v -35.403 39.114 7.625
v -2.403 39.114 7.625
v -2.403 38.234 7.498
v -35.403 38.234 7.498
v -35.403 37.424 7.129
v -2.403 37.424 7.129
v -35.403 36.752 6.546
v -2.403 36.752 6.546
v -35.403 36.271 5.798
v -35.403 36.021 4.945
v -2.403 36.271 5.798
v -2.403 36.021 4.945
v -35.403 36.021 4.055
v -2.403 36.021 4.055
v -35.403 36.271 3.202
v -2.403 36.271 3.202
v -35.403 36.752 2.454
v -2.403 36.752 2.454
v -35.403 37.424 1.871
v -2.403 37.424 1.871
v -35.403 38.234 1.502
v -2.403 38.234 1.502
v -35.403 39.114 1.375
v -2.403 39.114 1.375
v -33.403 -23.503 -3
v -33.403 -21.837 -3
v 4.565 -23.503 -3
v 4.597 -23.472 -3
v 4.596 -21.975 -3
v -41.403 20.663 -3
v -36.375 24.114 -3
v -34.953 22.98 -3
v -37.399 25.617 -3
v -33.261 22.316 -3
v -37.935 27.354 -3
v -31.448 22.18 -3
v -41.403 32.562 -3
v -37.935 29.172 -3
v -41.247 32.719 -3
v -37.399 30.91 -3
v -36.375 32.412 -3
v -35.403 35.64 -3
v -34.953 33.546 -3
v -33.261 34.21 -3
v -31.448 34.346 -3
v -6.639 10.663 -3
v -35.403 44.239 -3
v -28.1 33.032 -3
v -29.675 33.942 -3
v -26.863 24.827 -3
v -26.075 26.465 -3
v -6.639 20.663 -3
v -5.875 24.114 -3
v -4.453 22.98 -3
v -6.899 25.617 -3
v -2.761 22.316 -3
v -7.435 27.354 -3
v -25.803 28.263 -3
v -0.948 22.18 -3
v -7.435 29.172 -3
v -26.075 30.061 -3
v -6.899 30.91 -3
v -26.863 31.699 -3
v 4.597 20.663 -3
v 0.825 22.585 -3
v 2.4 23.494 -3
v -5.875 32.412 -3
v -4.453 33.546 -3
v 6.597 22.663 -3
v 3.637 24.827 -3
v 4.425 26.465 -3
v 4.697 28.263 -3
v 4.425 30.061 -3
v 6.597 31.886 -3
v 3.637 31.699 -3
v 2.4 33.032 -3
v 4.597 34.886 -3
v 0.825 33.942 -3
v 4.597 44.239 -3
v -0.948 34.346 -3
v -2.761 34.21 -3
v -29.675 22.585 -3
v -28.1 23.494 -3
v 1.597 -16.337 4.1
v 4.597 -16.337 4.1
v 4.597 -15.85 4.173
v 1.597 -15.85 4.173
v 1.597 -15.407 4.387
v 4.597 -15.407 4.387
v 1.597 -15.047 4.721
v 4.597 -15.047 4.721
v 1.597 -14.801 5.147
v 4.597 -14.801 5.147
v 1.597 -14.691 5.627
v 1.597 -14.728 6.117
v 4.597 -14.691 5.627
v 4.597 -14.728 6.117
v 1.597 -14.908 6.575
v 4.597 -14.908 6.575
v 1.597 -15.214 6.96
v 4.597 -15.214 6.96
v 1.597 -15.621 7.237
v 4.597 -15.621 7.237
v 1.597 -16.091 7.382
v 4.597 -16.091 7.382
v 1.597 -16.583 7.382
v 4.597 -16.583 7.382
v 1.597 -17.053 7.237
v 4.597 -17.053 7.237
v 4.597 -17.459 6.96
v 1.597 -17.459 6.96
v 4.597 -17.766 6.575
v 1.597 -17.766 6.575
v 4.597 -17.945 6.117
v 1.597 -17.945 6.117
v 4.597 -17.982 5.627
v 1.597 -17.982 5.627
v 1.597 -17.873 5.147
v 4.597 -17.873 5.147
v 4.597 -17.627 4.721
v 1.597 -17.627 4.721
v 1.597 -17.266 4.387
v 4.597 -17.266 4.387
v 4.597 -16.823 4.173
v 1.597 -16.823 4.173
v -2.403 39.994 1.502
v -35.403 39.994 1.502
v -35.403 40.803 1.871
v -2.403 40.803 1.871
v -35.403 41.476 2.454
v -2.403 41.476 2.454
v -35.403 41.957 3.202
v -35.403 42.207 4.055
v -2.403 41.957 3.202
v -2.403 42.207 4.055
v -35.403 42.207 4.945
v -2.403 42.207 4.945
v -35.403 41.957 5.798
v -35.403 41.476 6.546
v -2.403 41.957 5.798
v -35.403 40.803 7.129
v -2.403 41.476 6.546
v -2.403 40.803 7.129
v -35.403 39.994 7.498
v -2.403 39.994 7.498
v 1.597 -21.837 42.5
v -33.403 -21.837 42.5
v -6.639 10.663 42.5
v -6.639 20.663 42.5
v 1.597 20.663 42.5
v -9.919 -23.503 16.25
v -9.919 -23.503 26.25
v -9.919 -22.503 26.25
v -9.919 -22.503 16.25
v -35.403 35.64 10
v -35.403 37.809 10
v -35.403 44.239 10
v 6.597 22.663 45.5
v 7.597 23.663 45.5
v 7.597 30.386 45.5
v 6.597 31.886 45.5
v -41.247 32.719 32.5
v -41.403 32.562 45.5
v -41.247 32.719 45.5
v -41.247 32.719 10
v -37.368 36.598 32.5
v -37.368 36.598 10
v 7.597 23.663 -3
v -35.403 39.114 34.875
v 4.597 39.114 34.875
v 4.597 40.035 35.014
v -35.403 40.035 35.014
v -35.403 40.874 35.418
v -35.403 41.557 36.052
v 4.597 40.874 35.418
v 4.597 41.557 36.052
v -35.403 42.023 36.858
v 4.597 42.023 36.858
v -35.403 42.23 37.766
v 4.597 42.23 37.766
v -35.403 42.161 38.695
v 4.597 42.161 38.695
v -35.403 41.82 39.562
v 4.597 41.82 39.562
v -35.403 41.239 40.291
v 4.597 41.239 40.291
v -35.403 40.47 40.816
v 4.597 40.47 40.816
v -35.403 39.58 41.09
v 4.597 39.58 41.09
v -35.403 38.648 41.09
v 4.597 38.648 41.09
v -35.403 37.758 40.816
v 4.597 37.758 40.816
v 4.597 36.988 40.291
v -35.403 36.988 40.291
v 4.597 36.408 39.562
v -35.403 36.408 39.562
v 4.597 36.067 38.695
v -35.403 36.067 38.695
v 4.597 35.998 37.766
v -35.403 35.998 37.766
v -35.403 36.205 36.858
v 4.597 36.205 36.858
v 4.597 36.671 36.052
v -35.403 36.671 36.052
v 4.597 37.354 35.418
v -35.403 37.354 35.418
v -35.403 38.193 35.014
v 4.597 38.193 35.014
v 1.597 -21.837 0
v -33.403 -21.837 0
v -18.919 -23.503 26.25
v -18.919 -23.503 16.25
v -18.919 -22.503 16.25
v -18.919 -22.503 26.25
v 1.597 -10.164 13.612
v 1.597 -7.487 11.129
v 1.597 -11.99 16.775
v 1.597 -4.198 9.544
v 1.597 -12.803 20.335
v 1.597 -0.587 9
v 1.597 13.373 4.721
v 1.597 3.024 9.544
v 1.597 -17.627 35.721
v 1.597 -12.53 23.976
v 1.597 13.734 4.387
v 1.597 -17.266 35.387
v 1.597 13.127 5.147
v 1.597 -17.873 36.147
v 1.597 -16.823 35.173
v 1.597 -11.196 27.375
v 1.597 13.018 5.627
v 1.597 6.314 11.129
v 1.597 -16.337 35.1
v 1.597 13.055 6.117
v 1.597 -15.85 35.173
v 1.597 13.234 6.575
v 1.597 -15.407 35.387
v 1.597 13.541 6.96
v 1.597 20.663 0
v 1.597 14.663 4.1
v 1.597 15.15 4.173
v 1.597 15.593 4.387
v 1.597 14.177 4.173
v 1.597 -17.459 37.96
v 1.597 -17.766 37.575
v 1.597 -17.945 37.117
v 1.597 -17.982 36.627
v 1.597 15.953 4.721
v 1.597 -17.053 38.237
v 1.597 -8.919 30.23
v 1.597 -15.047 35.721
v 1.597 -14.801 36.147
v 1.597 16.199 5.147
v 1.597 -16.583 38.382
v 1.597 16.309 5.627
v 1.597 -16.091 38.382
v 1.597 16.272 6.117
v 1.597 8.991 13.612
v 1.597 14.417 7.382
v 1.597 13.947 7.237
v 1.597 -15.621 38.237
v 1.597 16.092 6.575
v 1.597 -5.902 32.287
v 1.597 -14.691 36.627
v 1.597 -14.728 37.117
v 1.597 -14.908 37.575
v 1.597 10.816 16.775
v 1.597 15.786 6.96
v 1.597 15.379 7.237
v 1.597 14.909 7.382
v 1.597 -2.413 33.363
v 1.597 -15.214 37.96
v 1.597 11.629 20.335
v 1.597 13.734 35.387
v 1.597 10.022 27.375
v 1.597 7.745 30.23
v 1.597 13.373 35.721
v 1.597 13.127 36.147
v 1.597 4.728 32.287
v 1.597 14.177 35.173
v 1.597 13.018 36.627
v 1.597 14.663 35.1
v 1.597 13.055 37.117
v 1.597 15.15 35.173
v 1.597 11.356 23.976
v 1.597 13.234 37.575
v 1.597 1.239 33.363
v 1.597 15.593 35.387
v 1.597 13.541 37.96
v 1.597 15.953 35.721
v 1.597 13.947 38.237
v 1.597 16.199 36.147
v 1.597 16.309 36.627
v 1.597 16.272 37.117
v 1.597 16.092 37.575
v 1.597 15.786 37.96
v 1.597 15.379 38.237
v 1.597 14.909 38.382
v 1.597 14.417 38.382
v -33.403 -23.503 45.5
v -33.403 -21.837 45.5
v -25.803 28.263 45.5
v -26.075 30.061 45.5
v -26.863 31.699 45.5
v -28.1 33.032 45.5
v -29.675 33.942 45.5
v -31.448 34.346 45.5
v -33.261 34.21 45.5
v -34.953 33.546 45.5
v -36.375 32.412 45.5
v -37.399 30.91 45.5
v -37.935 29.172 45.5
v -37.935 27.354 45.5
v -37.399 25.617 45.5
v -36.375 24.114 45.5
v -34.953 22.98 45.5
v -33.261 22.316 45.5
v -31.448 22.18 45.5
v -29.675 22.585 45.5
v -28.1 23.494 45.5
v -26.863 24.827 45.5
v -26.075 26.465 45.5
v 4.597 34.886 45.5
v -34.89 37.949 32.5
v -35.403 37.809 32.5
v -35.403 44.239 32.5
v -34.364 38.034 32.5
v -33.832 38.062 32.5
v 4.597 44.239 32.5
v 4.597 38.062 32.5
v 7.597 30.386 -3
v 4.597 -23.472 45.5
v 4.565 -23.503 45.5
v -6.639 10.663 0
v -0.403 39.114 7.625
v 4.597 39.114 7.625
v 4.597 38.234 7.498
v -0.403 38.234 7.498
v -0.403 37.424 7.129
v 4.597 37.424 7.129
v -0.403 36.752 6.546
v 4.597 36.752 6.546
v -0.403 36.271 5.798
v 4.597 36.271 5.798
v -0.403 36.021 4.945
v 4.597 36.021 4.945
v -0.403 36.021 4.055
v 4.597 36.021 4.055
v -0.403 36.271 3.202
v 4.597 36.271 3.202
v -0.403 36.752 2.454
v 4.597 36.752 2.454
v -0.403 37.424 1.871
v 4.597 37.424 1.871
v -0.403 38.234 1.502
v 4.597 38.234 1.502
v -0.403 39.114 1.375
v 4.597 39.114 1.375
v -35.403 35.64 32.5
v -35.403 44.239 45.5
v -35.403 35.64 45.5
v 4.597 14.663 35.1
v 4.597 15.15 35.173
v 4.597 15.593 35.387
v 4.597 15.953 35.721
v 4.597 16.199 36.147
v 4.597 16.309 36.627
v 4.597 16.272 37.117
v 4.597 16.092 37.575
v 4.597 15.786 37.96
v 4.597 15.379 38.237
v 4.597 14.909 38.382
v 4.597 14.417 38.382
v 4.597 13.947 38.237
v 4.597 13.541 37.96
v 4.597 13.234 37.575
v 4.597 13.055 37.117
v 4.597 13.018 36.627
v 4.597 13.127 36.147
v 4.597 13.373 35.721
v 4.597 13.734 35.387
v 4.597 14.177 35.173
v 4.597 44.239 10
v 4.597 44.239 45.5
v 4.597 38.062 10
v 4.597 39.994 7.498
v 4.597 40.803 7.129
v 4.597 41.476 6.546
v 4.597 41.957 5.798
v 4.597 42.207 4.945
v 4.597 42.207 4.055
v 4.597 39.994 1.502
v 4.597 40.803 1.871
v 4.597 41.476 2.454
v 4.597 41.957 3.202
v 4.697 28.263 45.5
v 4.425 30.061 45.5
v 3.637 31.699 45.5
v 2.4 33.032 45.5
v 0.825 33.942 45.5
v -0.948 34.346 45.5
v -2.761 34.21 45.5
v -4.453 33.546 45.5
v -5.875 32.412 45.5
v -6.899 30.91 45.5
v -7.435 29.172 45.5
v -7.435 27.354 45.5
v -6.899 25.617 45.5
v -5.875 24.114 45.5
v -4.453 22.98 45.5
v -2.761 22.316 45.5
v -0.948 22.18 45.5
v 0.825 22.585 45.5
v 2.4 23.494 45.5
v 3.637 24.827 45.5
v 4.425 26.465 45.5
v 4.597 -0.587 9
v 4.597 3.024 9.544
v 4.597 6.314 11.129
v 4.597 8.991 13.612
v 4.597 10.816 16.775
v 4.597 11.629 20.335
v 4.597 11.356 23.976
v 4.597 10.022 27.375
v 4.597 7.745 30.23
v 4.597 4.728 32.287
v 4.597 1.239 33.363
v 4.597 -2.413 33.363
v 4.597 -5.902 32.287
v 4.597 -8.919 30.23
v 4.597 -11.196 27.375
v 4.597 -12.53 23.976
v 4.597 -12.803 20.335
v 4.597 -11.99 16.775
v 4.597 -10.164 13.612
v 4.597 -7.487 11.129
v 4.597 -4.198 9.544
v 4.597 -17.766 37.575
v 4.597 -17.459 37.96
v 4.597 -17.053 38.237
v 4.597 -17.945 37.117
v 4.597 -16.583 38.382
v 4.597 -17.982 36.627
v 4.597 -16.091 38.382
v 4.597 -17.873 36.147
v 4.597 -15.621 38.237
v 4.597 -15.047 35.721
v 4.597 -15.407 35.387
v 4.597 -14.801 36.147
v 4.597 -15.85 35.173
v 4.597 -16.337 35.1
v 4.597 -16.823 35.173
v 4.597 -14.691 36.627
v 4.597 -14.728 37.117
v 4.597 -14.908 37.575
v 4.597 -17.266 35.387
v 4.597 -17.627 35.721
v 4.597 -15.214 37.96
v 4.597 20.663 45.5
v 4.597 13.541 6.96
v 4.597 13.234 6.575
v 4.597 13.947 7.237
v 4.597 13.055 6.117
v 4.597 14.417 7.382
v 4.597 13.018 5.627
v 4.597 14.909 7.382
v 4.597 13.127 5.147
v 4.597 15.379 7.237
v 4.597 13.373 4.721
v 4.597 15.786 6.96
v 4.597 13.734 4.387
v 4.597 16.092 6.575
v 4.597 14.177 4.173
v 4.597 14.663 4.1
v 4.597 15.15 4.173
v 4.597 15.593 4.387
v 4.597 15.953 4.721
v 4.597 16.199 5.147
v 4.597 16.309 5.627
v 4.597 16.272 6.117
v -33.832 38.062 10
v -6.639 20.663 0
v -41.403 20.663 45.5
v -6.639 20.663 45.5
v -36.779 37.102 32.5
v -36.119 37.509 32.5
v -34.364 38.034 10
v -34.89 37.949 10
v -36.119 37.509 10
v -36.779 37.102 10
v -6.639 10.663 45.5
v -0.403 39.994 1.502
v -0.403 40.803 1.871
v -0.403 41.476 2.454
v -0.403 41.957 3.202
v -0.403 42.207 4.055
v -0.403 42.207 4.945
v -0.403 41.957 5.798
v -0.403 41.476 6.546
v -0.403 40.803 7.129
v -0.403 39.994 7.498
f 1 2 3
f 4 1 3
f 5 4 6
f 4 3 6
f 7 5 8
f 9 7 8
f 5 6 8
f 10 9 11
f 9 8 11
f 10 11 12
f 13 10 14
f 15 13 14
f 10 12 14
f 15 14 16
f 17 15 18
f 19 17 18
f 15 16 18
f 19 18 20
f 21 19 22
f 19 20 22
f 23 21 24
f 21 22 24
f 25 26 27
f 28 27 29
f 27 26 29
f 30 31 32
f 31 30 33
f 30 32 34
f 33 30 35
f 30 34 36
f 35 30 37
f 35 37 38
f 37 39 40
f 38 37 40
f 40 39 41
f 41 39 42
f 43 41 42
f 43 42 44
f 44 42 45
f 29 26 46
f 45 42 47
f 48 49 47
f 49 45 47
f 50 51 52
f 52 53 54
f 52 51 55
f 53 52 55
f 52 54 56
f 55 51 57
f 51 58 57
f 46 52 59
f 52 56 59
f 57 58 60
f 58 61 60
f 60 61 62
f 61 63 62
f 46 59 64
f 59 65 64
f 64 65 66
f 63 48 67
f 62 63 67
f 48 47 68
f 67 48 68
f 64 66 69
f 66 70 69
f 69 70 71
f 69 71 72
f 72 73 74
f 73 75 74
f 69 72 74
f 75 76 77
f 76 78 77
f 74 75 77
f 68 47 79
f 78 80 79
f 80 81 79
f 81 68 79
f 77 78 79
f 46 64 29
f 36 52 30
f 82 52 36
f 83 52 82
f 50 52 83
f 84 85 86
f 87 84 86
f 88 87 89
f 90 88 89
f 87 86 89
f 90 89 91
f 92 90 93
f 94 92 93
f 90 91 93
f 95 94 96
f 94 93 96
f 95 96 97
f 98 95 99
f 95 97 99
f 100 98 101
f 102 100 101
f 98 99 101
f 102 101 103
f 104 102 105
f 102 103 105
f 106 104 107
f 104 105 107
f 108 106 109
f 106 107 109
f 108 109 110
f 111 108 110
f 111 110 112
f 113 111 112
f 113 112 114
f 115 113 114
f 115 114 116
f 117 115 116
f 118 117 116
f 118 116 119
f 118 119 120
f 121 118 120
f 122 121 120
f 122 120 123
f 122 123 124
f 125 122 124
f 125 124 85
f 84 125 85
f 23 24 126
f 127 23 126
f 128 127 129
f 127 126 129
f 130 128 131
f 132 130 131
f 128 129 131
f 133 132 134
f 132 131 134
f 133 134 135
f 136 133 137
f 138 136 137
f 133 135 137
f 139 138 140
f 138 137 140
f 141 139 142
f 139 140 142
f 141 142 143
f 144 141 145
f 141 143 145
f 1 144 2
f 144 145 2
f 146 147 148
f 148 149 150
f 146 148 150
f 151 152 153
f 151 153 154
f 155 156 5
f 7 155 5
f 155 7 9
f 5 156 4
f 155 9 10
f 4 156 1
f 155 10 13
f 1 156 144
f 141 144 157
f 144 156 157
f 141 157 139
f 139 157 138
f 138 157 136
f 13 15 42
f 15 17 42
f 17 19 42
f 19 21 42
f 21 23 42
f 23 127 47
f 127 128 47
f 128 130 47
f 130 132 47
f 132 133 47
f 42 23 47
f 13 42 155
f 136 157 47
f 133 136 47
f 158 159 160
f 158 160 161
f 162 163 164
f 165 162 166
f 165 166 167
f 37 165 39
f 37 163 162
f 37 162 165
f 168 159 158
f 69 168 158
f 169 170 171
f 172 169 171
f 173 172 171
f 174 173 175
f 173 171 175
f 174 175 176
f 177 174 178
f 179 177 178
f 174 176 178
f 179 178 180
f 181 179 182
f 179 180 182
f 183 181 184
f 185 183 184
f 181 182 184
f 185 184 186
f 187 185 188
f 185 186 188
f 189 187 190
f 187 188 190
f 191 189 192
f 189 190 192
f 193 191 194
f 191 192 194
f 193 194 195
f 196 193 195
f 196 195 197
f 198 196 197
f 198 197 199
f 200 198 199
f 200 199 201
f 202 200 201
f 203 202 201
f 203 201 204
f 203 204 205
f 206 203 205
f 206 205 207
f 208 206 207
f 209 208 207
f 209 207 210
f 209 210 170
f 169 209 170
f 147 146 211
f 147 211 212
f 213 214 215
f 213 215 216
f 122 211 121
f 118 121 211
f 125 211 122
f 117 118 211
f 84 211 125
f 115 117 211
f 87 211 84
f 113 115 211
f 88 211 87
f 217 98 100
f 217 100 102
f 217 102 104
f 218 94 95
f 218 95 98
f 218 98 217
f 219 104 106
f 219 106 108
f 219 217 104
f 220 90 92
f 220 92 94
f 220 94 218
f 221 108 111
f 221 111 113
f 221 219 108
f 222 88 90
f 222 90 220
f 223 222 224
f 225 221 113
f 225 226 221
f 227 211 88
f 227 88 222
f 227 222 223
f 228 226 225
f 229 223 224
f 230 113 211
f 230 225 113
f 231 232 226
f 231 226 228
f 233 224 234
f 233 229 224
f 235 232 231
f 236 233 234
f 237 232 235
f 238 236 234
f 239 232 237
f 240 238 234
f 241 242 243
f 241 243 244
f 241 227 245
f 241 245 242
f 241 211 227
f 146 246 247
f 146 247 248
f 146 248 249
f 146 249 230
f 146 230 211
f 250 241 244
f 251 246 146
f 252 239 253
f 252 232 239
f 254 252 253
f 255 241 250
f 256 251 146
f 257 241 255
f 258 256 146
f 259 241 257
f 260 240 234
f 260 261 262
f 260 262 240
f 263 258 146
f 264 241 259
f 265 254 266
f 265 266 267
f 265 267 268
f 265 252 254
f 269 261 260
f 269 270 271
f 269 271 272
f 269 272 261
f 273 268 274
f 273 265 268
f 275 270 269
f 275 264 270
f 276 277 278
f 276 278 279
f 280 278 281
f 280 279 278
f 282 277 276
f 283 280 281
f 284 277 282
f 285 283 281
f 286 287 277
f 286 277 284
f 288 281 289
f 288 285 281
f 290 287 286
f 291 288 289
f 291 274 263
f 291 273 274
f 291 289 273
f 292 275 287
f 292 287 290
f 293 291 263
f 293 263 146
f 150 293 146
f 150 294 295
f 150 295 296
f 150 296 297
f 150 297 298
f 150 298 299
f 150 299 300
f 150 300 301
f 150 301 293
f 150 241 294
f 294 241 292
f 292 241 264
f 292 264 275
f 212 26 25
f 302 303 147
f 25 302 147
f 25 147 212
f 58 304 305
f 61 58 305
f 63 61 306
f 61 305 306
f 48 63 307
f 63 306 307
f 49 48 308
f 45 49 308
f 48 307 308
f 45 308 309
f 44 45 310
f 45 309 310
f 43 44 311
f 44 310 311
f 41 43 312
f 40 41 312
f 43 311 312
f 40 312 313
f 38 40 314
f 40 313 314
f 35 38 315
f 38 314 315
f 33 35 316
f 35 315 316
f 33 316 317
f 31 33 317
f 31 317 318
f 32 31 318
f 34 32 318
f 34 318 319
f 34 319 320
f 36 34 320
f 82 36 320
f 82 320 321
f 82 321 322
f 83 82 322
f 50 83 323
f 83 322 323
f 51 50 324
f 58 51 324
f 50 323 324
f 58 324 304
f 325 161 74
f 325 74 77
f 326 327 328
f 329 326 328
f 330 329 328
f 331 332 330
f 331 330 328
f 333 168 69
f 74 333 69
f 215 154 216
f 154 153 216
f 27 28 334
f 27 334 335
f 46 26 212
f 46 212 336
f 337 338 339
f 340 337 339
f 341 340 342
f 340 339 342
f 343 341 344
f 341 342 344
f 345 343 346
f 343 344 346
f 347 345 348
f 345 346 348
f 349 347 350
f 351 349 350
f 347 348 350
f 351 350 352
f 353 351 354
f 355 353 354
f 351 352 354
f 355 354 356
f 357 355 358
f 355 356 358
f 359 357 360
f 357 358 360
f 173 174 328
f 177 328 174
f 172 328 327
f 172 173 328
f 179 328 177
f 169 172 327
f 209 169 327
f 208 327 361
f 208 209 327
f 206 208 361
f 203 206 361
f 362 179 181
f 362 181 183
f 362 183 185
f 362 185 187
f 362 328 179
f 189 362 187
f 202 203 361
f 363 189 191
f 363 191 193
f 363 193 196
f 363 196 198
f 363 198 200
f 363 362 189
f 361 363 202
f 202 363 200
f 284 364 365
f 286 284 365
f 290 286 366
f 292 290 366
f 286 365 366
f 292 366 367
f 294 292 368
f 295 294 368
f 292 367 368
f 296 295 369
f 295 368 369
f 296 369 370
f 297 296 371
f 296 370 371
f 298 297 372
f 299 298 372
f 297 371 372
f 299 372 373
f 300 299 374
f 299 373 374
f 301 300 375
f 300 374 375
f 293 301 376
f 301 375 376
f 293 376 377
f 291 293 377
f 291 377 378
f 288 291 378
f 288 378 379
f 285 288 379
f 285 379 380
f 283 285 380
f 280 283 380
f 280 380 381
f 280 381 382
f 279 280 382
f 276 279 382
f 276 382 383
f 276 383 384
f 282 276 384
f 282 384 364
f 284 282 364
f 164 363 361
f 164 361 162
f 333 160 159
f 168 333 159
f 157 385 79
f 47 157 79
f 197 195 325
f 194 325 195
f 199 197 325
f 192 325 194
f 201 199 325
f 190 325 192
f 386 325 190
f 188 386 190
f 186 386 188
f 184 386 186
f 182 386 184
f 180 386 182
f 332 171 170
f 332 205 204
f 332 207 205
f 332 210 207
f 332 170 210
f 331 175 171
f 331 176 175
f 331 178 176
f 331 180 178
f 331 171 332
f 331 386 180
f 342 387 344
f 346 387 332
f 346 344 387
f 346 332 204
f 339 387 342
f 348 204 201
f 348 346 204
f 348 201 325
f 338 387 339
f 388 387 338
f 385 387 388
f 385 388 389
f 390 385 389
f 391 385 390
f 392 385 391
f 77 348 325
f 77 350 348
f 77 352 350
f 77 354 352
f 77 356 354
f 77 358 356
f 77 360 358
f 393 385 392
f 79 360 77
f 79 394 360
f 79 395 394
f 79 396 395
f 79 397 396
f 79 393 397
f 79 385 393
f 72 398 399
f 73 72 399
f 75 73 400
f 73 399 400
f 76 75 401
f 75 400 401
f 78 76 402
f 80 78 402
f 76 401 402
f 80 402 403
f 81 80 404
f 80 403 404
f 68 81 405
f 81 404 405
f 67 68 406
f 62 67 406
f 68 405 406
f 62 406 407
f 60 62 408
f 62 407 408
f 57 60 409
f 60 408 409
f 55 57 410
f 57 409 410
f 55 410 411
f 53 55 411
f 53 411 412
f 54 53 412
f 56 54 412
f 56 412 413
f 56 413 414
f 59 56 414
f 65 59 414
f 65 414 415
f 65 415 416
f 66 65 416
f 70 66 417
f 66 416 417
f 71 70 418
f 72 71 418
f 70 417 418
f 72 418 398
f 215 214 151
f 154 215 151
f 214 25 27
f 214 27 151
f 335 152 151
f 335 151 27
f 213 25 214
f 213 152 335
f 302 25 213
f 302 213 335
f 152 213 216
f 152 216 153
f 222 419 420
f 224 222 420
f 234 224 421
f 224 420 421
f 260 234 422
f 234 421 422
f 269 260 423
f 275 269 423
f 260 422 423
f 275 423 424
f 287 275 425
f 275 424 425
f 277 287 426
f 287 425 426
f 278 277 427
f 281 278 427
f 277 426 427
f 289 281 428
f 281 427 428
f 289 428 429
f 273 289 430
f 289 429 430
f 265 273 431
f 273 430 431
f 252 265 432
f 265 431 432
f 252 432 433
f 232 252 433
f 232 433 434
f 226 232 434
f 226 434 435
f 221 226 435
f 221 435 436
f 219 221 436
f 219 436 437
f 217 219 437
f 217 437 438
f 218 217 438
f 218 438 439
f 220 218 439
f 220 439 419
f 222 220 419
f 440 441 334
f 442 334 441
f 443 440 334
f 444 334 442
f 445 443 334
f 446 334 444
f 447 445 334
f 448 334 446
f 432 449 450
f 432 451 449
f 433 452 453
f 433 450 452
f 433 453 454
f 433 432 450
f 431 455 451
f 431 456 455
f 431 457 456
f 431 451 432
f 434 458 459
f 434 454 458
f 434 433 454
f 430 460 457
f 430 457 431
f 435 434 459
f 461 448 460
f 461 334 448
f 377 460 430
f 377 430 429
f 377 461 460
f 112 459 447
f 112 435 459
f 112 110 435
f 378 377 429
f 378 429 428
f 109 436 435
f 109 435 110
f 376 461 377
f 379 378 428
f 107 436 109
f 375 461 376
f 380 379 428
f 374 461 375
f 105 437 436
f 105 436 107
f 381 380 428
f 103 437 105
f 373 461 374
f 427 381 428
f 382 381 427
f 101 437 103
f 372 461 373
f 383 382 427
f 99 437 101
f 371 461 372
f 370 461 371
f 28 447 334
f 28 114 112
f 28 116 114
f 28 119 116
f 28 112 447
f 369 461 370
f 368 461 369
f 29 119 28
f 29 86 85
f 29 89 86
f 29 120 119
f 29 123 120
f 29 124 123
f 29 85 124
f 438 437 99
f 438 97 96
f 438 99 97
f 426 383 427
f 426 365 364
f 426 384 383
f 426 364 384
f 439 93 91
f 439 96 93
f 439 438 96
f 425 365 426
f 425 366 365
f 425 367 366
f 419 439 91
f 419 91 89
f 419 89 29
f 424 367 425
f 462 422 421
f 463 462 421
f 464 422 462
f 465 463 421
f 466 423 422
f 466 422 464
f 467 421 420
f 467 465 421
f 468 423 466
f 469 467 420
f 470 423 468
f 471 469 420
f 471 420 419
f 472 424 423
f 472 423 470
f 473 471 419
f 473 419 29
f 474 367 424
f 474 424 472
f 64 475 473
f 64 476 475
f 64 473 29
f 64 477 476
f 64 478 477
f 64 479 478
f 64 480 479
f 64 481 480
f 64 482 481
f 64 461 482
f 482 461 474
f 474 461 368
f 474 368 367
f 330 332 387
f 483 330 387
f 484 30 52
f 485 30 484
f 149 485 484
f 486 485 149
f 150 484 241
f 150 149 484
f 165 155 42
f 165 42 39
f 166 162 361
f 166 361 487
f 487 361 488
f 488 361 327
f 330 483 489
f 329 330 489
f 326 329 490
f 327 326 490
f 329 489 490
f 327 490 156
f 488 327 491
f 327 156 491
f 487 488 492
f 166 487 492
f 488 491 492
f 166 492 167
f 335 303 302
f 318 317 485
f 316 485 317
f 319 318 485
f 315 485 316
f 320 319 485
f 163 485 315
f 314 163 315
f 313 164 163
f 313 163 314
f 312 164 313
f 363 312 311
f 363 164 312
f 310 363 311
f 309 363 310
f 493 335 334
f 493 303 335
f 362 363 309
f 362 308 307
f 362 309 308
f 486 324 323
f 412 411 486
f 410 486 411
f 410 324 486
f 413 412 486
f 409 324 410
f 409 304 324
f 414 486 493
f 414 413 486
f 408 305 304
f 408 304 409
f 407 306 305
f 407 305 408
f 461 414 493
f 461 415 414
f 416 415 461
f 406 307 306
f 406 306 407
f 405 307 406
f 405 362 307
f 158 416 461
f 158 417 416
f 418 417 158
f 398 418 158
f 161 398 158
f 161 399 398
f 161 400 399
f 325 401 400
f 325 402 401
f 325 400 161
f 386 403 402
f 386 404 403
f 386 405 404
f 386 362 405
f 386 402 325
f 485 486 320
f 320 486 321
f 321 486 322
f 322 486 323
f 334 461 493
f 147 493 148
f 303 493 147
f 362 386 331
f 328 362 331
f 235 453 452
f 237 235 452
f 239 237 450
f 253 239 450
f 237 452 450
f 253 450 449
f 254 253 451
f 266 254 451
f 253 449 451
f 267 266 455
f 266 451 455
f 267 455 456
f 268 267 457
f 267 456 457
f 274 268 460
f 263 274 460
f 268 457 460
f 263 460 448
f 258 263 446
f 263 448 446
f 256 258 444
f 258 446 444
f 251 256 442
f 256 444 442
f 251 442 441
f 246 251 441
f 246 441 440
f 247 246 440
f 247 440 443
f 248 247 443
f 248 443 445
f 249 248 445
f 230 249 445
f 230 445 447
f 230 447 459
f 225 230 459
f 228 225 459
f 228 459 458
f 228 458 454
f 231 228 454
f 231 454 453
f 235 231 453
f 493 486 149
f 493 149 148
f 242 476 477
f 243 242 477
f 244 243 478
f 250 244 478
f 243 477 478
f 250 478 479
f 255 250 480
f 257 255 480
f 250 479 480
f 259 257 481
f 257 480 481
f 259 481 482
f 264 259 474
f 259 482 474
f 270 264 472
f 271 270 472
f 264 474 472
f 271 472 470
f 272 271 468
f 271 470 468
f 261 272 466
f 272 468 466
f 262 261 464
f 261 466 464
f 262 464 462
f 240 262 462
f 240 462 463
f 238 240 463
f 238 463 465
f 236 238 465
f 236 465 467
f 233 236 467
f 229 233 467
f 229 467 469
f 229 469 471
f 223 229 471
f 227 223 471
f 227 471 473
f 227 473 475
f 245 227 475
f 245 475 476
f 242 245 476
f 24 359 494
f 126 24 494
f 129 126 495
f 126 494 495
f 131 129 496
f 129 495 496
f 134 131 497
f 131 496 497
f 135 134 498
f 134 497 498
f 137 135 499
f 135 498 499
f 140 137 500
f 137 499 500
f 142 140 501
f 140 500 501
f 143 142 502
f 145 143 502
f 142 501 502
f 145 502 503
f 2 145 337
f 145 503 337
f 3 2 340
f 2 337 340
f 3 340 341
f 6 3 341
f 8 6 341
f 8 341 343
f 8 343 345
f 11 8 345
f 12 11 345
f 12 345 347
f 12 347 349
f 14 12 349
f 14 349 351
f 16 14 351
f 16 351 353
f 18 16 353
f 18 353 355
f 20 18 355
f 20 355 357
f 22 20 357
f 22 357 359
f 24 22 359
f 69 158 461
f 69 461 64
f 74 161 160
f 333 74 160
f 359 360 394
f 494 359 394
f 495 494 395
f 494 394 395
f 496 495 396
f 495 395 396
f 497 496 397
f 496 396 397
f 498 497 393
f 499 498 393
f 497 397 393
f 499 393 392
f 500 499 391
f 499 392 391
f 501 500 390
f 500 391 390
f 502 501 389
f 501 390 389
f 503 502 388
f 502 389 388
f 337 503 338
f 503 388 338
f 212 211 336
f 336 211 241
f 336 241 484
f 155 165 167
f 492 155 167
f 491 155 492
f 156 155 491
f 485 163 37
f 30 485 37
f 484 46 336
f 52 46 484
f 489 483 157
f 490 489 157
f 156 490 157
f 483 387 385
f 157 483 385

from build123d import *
from build123d.topology import SkipClean

# Parameters (mm, degrees)
SKETCH1_W            = 42.5
SKETCH1_H            = 55.85
BOSS_EXTRUDE2_DEPTH  = 42.5
SKETCH5_R            = 3.175
CUT_EXTRUDE2_DEPTH   = 42.5
SKETCH6_W            = 42.5
SKETCH6_H            = 42.5
CUT_EXTRUDE3_DEPTH   = 39.5
SKETCH7_R            = 12.25
SKETCH7_R_2          = 1.65
CUT_EXTRUDE4_DEPTH   = 39.5
SKETCH9_W            = 10
SKETCH9_H            = 42.5
CUT_EXTRUDE5_DEPTH   = 39.5
CHAMFER1_SIZE        = 3
CHAMFER2_SIZE        = 2
SKETCH10_W           = 3
SKETCH10_H           = 2.12759362
BOSS_EXTRUDE3_DEPTH  = 3
SKETCH12_W           = 3
SKETCH12_H           = 3
BOSS_EXTRUDE4_DEPTH  = 3
BOSS_EXTRUDE5_DEPTH  = 2
BOSS_EXTRUDE6_DEPTH  = 2
SKETCH16_W           = 9
SKETCH16_H           = 14.17
SKETCH16_R           = 3.125
BOSS_EXTRUDE8_DEPTH  = 5
SKETCH18_W           = 9
SKETCH18_H           = 12.353282928
BOSS_EXTRUDE9_DEPTH  = 2
SKETCH20_W           = 0.494527866
SKETCH20_H           = 3.5
BOSS_EXTRUDE10_DEPTH = 0.2
BOSS_EXTRUDE11_DEPTH = 42.5
BOSS_EXTRUDE12_DEPTH = 48.5
CUT_EXTRUDE8_DEPTH   = 54.5
BOSS_EXTRUDE15_DEPTH = 3
BOSS_EXTRUDE16_DEPTH = 3
BOSS_EXTRUDE17_DEPTH = 1
BOSS_EXTRUDE19_DEPTH = 3
BOSS_EXTRUDE20_DEPTH = 1
BOSS_EXTRUDE21_START = -3
SKETCH34_R           = 3.175
BOSS_EXTRUDE21_DEPTH = 3
SKETCH35_R           = 3.175
BOSS_EXTRUDE22_DEPTH = 3
BOSS_EXTRUDE23_DEPTH = 3
BOSS_EXTRUDE24_DEPTH = 3
CUT_EXTRUDE10_DEPTH  = 1
SKETCH41_W           = 48.5
SKETCH41_H           = 4.770205393
BOSS_EXTRUDE25_DEPTH = 1.3
CHAMFER3_SIZE        = 1.5
SKETCH44_W           = 1
SKETCH44_H           = 12.353282928
BOSS_EXTRUDE26_DEPTH = 7
SKETCH45_W           = 13
SKETCH45_H           = 8.5
SKETCH45_R           = 3.125
SKETCH45_H_2         = 13.67
BOSS_EXTRUDE27_DEPTH = 40
SKETCH46_R           = 3.125
CUT_EXTRUDE11_DEPTH  = 49
CUT_EXTRUDE12_DEPTH  = 68
CUT_EXTRUDE13_DEPTH  = 68
SKETCH49_W           = 2.643980288
SKETCH49_H           = 1.166461892
CUT_EXTRUDE14_DEPTH  = 68
BOSS_EXTRUDE28_DEPTH = 13
BOSS_EXTRUDE29_DEPTH = 48.5
SKETCH53_W           = 2
SKETCH53_H           = 11.22240638
BOSS_EXTRUDE30_DEPTH = 48.5
CHAMFER4_SIZE        = 2
SKETCH57_W           = 22.5
SKETCH57_H           = 6.176641464
BOSS_EXTRUDE32_DEPTH = 46
BOSS_EXTRUDE33_DEPTH = 48.5
BOSS_EXTRUDE35_DEPTH = 48.5
SKETCH55_R           = 6.1
CUT_EXTRUDE15_DEPTH  = 48.5
BOSS_EXTRUDE36_DEPTH = 48.5
SKETCH62_W           = 48.5
SKETCH62_H           = 0.4
CUT_EXTRUDE16_DEPTH  = 48.5
CHAMFER5_SIZE        = 5.5
FILLET1_R            = 5
CUT_EXTRUDE17_DEPTH  = 1
BOSS_EXTRUDE37_DEPTH = 48.5


# Some blends are built 0.0001 mm under size
with BuildPart() as part:
    # Sketch1 → Boss-Extrude2 (new body)
    with BuildSketch(Plane.XY):
        with Locations((-16.653499003, 3.960644895)):
            Rectangle(SKETCH1_W, SKETCH1_H)
    extrude(amount=BOSS_EXTRUDE2_DEPTH)

    # Sketch5 → Cut-Extrude2 (cut)
    with BuildSketch(Plane.XY.offset(42.5)):
        with Locations((-31.903499003, 25.965832134)):
            Circle(SKETCH5_R)
        with Locations(Location((-1.403499003, 25.965832134, 0), (0, 0, 180))):
            Circle(SKETCH5_R)
    extrude(amount=-CUT_EXTRUDE2_DEPTH, mode=Mode.SUBTRACT)

    # Sketch6 → Cut-Extrude3 (cut)
    with BuildSketch(Plane.ZY.offset(37.903499003)):
        with Locations((21.25, -0.586761485)):
            Rectangle(SKETCH6_W, SKETCH6_H)
    extrude(amount=-CUT_EXTRUDE3_DEPTH, mode=Mode.SUBTRACT)

    # Sketch7 → Cut-Extrude4 (cut)
    with BuildSketch(Plane(origin=(4.596500997, 0, 0), x_dir=(0, 0, -1), z_dir=(1, 0, 0))):
        with Locations((-21.25, -0.586761485)):
            Circle(SKETCH7_R)
        with Locations((-36.75, -16.336761485)):
            Circle(SKETCH7_R_2)
        with Locations((-5.75, -16.336761485)):
            Circle(SKETCH7_R_2)
        with Locations((-36.75, 14.663238515)):
            Circle(SKETCH7_R_2)
        with Locations((-5.75, 14.663238515)):
            Circle(SKETCH7_R_2)
    extrude(amount=-CUT_EXTRUDE4_DEPTH, mode=Mode.SUBTRACT)

    # Sketch9 → Cut-Extrude5 (cut)
    with BuildSketch(Plane.XZ.offset(23.964355105)):
        with Locations((-32.903499003, 21.25)):
            Rectangle(SKETCH9_W, SKETCH9_H)
    extrude(amount=-CUT_EXTRUDE5_DEPTH, mode=Mode.SUBTRACT)

    # Chamfer1
    chamfer1_edges = [part.edges().sort_by_distance(p)[0] for p in [
        (-37.903499003, 20.663238515, 21.25),
        (-37.903499003, 31.885644895, 21.25),
    ]]
    chamfer(chamfer1_edges, length=CHAMFER1_SIZE)

    # Chamfer2
    chamfer2_edges = [part.edges().sort_by_distance(p)[0] for p in [
        (4.596500997, -23.964355105, 21.25),
    ]]
    chamfer(chamfer2_edges, length=CHAMFER2_SIZE)

    # Sketch10 → Boss-Extrude3 (add)
    with BuildSketch(Plane.ZY.offset(27.903499003)):
        with Locations((44, -22.900558295)):
            Rectangle(SKETCH10_W, SKETCH10_H)
        with Locations((-1.5, -22.900558295)):
            Rectangle(SKETCH10_W, SKETCH10_H)
    extrude(amount=-BOSS_EXTRUDE3_DEPTH)

    # Sketch12 → Boss-Extrude4 (add)
    with BuildSketch(Plane.ZY.offset(-1.596500997)):
        with Locations((44, 19.163238515)):
            Rectangle(SKETCH12_W, SKETCH12_H)
        with Locations((-1.5, 19.163238515)):
            Rectangle(SKETCH12_W, SKETCH12_H)
    extrude(amount=-BOSS_EXTRUDE4_DEPTH)

    # Sketch13 → Boss-Extrude5 (add)
    with BuildSketch(Plane(origin=(0, 0, -3), x_dir=(-1, 0, 0), z_dir=(0, 0, -1))):
        Polygon((-1.596500997, 17.663238515), (24.903499003, -21.836761485), (27.903499003, -21.836761485), (-1.596500997, 20.663238515), align=None)
    extrude(amount=-BOSS_EXTRUDE5_DEPTH)

    # Sketch14 → Boss-Extrude6 (add)
    with BuildSketch(Plane.XY.offset(45.5)):
        Polygon((1.596500997, 17.663238515), (-24.903499003, -21.836761485), (-27.903499003, -21.836761485), (1.596500997, 20.663238515), align=None)
    extrude(amount=-BOSS_EXTRUDE6_DEPTH)

    # Sketch16 → Boss-Extrude8 (add)
    # profile 1 of 2: a face of its own
    with BuildSketch(Plane(origin=(4.596500997, 0, 0), x_dir=(0, 0, -1), z_dir=(1, 0, 0))):
        with Locations((-38, 37.153927823)):
            Rectangle(SKETCH16_W, SKETCH16_H)
        with Locations((-38, 39.113927823)):
            Circle(SKETCH16_R, mode=Mode.SUBTRACT)
    # profile 2 of 2: a face of its own
    with BuildSketch(Plane(origin=(4.596500997, 0, 0), x_dir=(0, 0, -1), z_dir=(1, 0, 0))):
        with Locations((-4.5, 37.153927823)):
            Rectangle(SKETCH16_W, SKETCH16_H)
        with Locations(Location((-4.5, 39.113927823, 0), (0, 0, 180))):
            Circle(SKETCH16_R, mode=Mode.SUBTRACT)
    extrude(amount=-BOSS_EXTRUDE8_DEPTH)

    # Sketch18 → Boss-Extrude9 (add)
    with BuildSketch(Plane.ZY.offset(0.403499003)):
        with Locations((4.5, 38.062286359)):
            Rectangle(SKETCH18_W, SKETCH18_H)
        with Locations((38, 38.062286359)):
            Rectangle(SKETCH18_W, SKETCH18_H)
    extrude(amount=BOSS_EXTRUDE9_DEPTH)

    # Sketch20 → Boss-Extrude10 (add)
    with BuildSketch(Plane.XZ.offset(23.964355105)):
        with Locations((-12.40623507, 23)):
            Rectangle(SKETCH20_W, SKETCH20_H)
    extrude(amount=BOSS_EXTRUDE10_DEPTH)

    # Sketch22 → Boss-Extrude11 (add)
    with BuildSketch(Plane.XY.offset(42.5)):
        Polygon((-27.903499003, -23.964355105), (-27.903499003, -24.964355105), (4.596500997, -24.964355105), (4.596500997, -21.964355105), (2.596500997, -23.964355105), align=None)
    extrude(amount=-BOSS_EXTRUDE11_DEPTH)

    # Sketch23 → Boss-Extrude12 (add)
    with BuildSketch(Plane.XY.offset(45.5)):
        Polygon((1.596500997, -21.836761485), (-33.403499003, -21.836761485), (-33.403499003, -24.836761485), (1.596500997, -24.964355105), align=None)
    extrude(amount=-BOSS_EXTRUDE12_DEPTH)

    # Sketch24 → Cut-Extrude8 (cut)
    with BuildSketch(Plane.XY.offset(45.5)):
        Polygon((-27.903499003, -24.856811911), (-27.903499003, -24.964355105), (1.596500997, -24.964355105), align=None)
    extrude(amount=-CUT_EXTRUDE8_DEPTH, mode=Mode.SUBTRACT)

    # Sketch28 → Boss-Extrude15 (add)
    with BuildSketch(Plane(origin=(-0.090985928, -24.958203317, 0), x_dir=(0.9999933551145118, -0.0036455077591437566, 0), z_dir=(-0.0036455077591437566, -0.9999933551145118, 0))):
        Polygon((-33.312734433, 45.5), (-33.312734433, -3), (1.687498139, -3), (4.687478204, -3), (4.687478204, 0), (4.687478204, 42.5), (4.687478204, 45.5), (1.532098916, 45.5), align=None)
    extrude(amount=-BOSS_EXTRUDE15_DEPTH)

    # Sketch30 → Boss-Extrude16 (add)
    with BuildSketch(Plane.XY.offset(45.5)):
        Polygon((4.596500997, 20.663238515), (1.596500997, 20.663238515), (-33.403499003, -21.836761485), (-33.403499003, -24.836761485), (4.596461128, -24.975291555), align=None)
    extrude(amount=-BOSS_EXTRUDE16_DEPTH)

    # Sketch31 → Boss-Extrude17 (add)
    with BuildSketch(Plane(origin=(4.596500997, 0, 0), x_dir=(0, 0, -1), z_dir=(1, 0, 0))):
        Polygon((-45.5, 20.663238515), (-40.56451316, 20.663238515), (-40.56451316, -21.975271766), (-45.5, -21.836761485), align=None)
    extrude(amount=-BOSS_EXTRUDE17_DEPTH)

    # Sketch32 → Boss-Extrude19 (add)
    with BuildSketch(Plane(origin=(0, 0, -3), x_dir=(-1, 0, 0), z_dir=(0, 0, -1))):
        Polygon((-4.596500997, 20.663238515), (-4.596461128, -24.975291555), (33.403499003, -24.836761485), (33.403499003, -21.836761485), (-1.596500997, 20.663238515), align=None)
    extrude(amount=-BOSS_EXTRUDE19_DEPTH)

    # Sketch33 → Boss-Extrude20 (add)
    with BuildSketch(Plane(origin=(4.596500997, 0, 0), x_dir=(0, 0, -1), z_dir=(1, 0, 0))):
        Polygon((3, 20.663238515), (-2.503573256, 20.663238515), (-2.503573256, -21.97531149), (3, -21.97527163), align=None)
    extrude(amount=-BOSS_EXTRUDE20_DEPTH)

    # Sketch34 → Boss-Extrude21 (add)
    with BuildSketch(Plane(origin=(0, 0, -3), x_dir=(-1, 0, 0), z_dir=(0, 0, -1)).offset(BOSS_EXTRUDE21_START)):
        Polygon((-4.596500997, 20.663238515), (34.903499003, 20.663238515), (37.903499003, 23.663238515), (37.903499003, 28.885644895), (34.903499003, 31.885644895), (2.403499003, 31.885644895), (2.403499003, 44.238927823), (-4.596500997, 44.238927823), align=None)
        with Locations((1.403499003, 25.965832134)):
            Circle(SKETCH34_R, mode=Mode.SUBTRACT)
        with Locations(Location((31.903499003, 25.965832134, 0), (0, 0, 180))):
            Circle(SKETCH34_R, mode=Mode.SUBTRACT)
    extrude(amount=BOSS_EXTRUDE21_DEPTH)

    # Sketch35 → Boss-Extrude22 (add)
    with BuildSketch(Plane.XY.offset(45.5)):
        Polygon((4.596500997, 20.663238515), (4.596500997, 44.238927823), (-2.403499003, 44.238927823), (-2.403499003, 31.885644895), (-34.903499003, 31.885644895), (-37.903499003, 28.885644895), (-37.903499003, 23.663238515), (-34.903499003, 20.663238515), align=None)
        with Locations((-31.903499003, 25.965832134)):
            Circle(SKETCH35_R, mode=Mode.SUBTRACT)
        with Locations((-1.403499003, 25.965832134)):
            Circle(SKETCH35_R, mode=Mode.SUBTRACT)
    extrude(amount=-BOSS_EXTRUDE22_DEPTH)

    # Sketch36 → Boss-Extrude23 (add)
    with BuildSketch(Plane(origin=(0, 0, -3), x_dir=(-1, 0, 0), z_dir=(0, 0, -1))):
        Polygon((-1.596500997, 20.663238515), (6.63879312, 10.663238515), (6.63879312, 20.663238515), align=None)
    extrude(amount=-BOSS_EXTRUDE23_DEPTH)

    # Sketch37 → Boss-Extrude24 (add)
    with BuildSketch(Plane.XY.offset(45.5)):
        Polygon((-6.63879312, 20.663238515), (-6.63879312, 10.663238515), (1.596500997, 20.663238515), align=None)
    extrude(amount=-BOSS_EXTRUDE24_DEPTH)

    # Sketch40 → Cut-Extrude10 (cut)
    with BuildSketch(Plane(origin=(4.687447057, -0.017088238, 0), x_dir=(0, 0, -1), z_dir=(0.9999933551145119, -0.003645507759143759, 0))):
        Polygon((-45.5, -21.819859802), (-45.5, -24.958369162), (3, -24.958369162), (3, -21.958369162), align=None)
    extrude(amount=-CUT_EXTRUDE10_DEPTH, mode=Mode.SUBTRACT)

    # Sketch41 → Boss-Extrude25 (add)
    with BuildSketch(Plane(origin=(4.596500997, 0, 0), x_dir=(0, 0, -1), z_dir=(1, 0, 0))):
        with Locations((-21.25, -22.586543351)):
            Rectangle(SKETCH41_W, SKETCH41_H)
    extrude(amount=-BOSS_EXTRUDE25_DEPTH)

    # Chamfer3
    # the kernel refuses this chamfer: 1.5 mm, written as the material it takes off along each edge
    with BuildSketch(Plane(origin=(4.596500997, -24.971646047, 49.357524482), x_dir=(0.02749587661058619, 0.9996219169112968, 0), z_dir=(0, 0, -1))) as chamfer3_piece_1:
        Polygon((CHAMFER3_SIZE * 0.999621916911, -CHAMFER3_SIZE * 0.0274958766106), (-CHAMFER3_SIZE * 0.0274958766106, -CHAMFER3_SIZE * 0.999621916911), (0, 0), align=None)
    extrude(amount=56.215048964, mode=Mode.SUBTRACT)

    # Sketch44 → Boss-Extrude26 (add)
    with BuildSketch(Plane(origin=(4.596500997, 0, 0), x_dir=(0, 0, -1), z_dir=(1, 0, 0))):
        with Locations((-33, 38.062286359)):
            Rectangle(SKETCH44_W, SKETCH44_H)
        with Locations((-9.5, 38.062286359)):
            Rectangle(SKETCH44_W, SKETCH44_H)
    extrude(amount=-BOSS_EXTRUDE26_DEPTH)

    # Sketch45 → Boss-Extrude27 (add)
    # profile 1 of 2: a face of its own
    with BuildSketch(Plane(origin=(4.596500997, 0, 0), x_dir=(0, 0, -1), z_dir=(1, 0, 0))):
        with Locations((-39, 39.988927823)):
            Rectangle(SKETCH45_W, SKETCH45_H)
        with Locations((-38, 39.113927823)):
            Circle(SKETCH45_R, mode=Mode.SUBTRACT)
    # profile 2 of 2: a face of its own
    with BuildSketch(Plane(origin=(4.596500997, 0, 0), x_dir=(0, 0, -1), z_dir=(1, 0, 0))):
        with Locations((-3.5, 37.403927823)):
            Rectangle(SKETCH45_W, SKETCH45_H_2)
        with Locations(Location((-4.5, 39.113927823, 0), (0, 0, 180))):
            Circle(SKETCH45_R, mode=Mode.SUBTRACT)
    extrude(amount=-BOSS_EXTRUDE27_DEPTH)

    # Sketch46 → Cut-Extrude11 (cut)
    with BuildSketch(Plane(origin=(4.596500997, 0, 0), x_dir=(0, 0, -1), z_dir=(1, 0, 0))):
        with Locations((-38, 39.113927823)):
            Circle(SKETCH46_R)
        with Locations((-4.5, 39.113927823)):
            Circle(SKETCH46_R)
    extrude(amount=-CUT_EXTRUDE11_DEPTH, mode=Mode.SUBTRACT)

    # Sketch47 → Cut-Extrude12 (cut)
    with BuildSketch(Plane.ZY.offset(33.403499003)):
        Polygon((-3, -24.903295754), (-3, -23.903295754), (45.5, -23.903295754), (45.5, -24.836761485), align=None)
    extrude(amount=-CUT_EXTRUDE12_DEPTH, mode=Mode.SUBTRACT)


with BuildPart() as cut_extrude12_piece_1:
    # of the separate pieces the step leaves, piece 1, a body of its own (cut_extrude12_pieces)
    add(part.part.solids().sort_by_distance((4.596500997, 44.238927823, 32.5))[0])

    # Sketch51 → Boss-Extrude28 (add)
    with BuildSketch(Plane.XY.offset(45.5)):
        Polygon((-35.403499003, 35.738927823), (-35.403499003, 31.385644895), (-34.903499003, 31.885644895), (-2.403499003, 31.885644895), (-2.403499003, 35.738927823), align=None)
    extrude(amount=-BOSS_EXTRUDE28_DEPTH)

    # Sketch52 → Boss-Extrude29 (add)
    with BuildSketch(Plane.XY.offset(45.5)):
        Polygon((-41.403499003, 20.663238515), (-34.903499003, 20.663238515), (-37.903499003, 23.663238515), (-37.903499003, 28.885644895), (-35.403499003, 31.385644895), (-35.403499003, 32.640472598), (-41.403499003, 32.640472598), align=None)
    extrude(amount=-BOSS_EXTRUDE29_DEPTH)

    # Sketch53 → Boss-Extrude30 (add)
    with BuildSketch(Plane.XY.offset(45.5)):
        with Locations((5.596500997, 26.274441705)):
            Rectangle(SKETCH53_W, SKETCH53_H)
    extrude(amount=-BOSS_EXTRUDE30_DEPTH)

    # Chamfer4
    chamfer4_edges = [cut_extrude12_piece_1.edges().sort_by_distance(p)[0] for p in [
        (6.596500997, 20.663238515, 21.25),
        (6.596500997, 31.885644895, 21.25),
    ]]
    chamfer(chamfer4_edges, length=CHAMFER4_SIZE - 0.0001)  # a hair under: the kernel refuses the full size

    # Sketch57 → Boss-Extrude32 (add)
    with BuildSketch(Plane(origin=(4.596500997, 0, 0), x_dir=(0, 0, -1), z_dir=(1, 0, 0))):
        with Locations((-21.25, 34.973965627)):
            Rectangle(SKETCH57_W, SKETCH57_H)
    extrude(amount=-BOSS_EXTRUDE32_DEPTH)

    # Sketch58 → Boss-Extrude33 (add)
    with BuildSketch(Plane.XY.offset(45.5)):
        Polygon((4.596500997, 31.885644895), (6.596500997, 29.885644895), (6.596500997, 31.885644895), align=None)
    extrude(amount=-BOSS_EXTRUDE33_DEPTH)

    # Sketch60 → Boss-Extrude35 (add)
    with BuildSketch(Plane.XY.offset(45.5)):
        Polygon((-35.403499003, 35.640472598), (-41.403499003, 32.640472598), (-35.403499003, 32.640472598), align=None)
    extrude(amount=-BOSS_EXTRUDE35_DEPTH)

    # Sketch55 → Cut-Extrude15 (cut)
    with BuildSketch(Plane.XY.offset(45.5)):
        with Locations((-31.903499003, 28.263238515)):
            Circle(SKETCH55_R)
        with Locations((-1.403499003, 28.263238515)):
            Circle(SKETCH55_R)
    extrude(amount=-CUT_EXTRUDE15_DEPTH, mode=Mode.SUBTRACT)

    # Sketch61 → Boss-Extrude36 (add)
    with BuildSketch(Plane.XY.offset(45.5)):
        Polygon((4.596500997, 31.885644895), (6.596500997, 31.885644895), (4.596500997, 34.885644895), align=None)
    extrude(amount=-BOSS_EXTRUDE36_DEPTH)

    # Sketch62 → Cut-Extrude16 (cut)
    with BuildSketch(Plane.ZY.offset(33.403499003)):
        with Locations((21.25, -23.703295754)):
            Rectangle(SKETCH62_W, SKETCH62_H)
    extrude(amount=-CUT_EXTRUDE16_DEPTH, mode=Mode.SUBTRACT)

    # Chamfer5
    chamfer5_edges = [cut_extrude12_piece_1.edges().sort_by_distance(p)[0] for p in [
        (-41.403499003, 38.062286359, 21.25),
    ]]
    chamfer(chamfer5_edges, length=CHAMFER5_SIZE)

    # Fillet1
    # the kernel refuses this fillet: 5 mm, written as the material it takes off along each edge
    with BuildSketch(Plane(origin=(-35.903499003, 38.062286359, 10), x_dir=(-0.7071067811865476, -0.7071067811865476, 0), z_dir=(0, 0, 1))) as fillet1_piece_1:
        with BuildLine():
            CenterArc((FILLET1_R * 0.414213562373, FILLET1_R), FILLET1_R, 225, 45)
            Line((-FILLET1_R * 0.292893218813, FILLET1_R * 0.292893218813), (0, 0))
            Line((0, 0), (FILLET1_R * 0.414213562373, 0))
        make_face()
    extrude(amount=22.5, mode=Mode.SUBTRACT)

    # Sketch65 → Cut-Extrude17 (cut)
    with BuildSketch(Plane.XZ.offset(23.503295754)):
        Polygon((-14.419323856, 16.25), (-18.919323856, 16.25), (-18.919323856, 26.25), (-9.919323856, 26.25), (-9.919323856, 16.25), align=None)
    extrude(amount=-CUT_EXTRUDE17_DEPTH, mode=Mode.SUBTRACT)

    # Sketch67 → Boss-Extrude37 (add)
    with SkipClean():  # the faces are left unmerged after this step: merging them gives an invalid solid
        with BuildSketch(Plane.XY.offset(45.5)):
            Polygon((6.596500997, 31.885644895), (7.596500997, 30.385644895), (7.596500997, 23.663238515), (6.596500997, 22.663238515), align=None)
        extrude(amount=-BOSS_EXTRUDE37_DEPTH)


with BuildPart() as cut_extrude12_piece_2:
    # of the separate pieces the step leaves, piece 2, a body of its own (cut_extrude12_pieces)
    add(part.part.solids().sort_by_distance((3.23138556, -24.836761485, 45.5))[0])

    # Sketch48 → Cut-Extrude13 (cut)
    with BuildSketch(Plane.ZY.offset(33.403499003)):
        Polygon((-2.929774612, -24.185457139), (-2.929774612, -25.519392631), (45.758870815, -25.786179729), (45.758870815, -24.185457139), align=None)
    extrude(amount=-CUT_EXTRUDE13_DEPTH, mode=Mode.SUBTRACT)

    # Sketch49 → Cut-Extrude14 (cut)
    with BuildSketch(Plane.ZY.offset(33.403499003)):
        with Locations((-2.157001957, -24.67821455)):
            Rectangle(SKETCH49_W, SKETCH49_H)
    extrude(amount=-CUT_EXTRUDE14_DEPTH, mode=Mode.SUBTRACT)


solid = cut_extrude12_piece_1.part
